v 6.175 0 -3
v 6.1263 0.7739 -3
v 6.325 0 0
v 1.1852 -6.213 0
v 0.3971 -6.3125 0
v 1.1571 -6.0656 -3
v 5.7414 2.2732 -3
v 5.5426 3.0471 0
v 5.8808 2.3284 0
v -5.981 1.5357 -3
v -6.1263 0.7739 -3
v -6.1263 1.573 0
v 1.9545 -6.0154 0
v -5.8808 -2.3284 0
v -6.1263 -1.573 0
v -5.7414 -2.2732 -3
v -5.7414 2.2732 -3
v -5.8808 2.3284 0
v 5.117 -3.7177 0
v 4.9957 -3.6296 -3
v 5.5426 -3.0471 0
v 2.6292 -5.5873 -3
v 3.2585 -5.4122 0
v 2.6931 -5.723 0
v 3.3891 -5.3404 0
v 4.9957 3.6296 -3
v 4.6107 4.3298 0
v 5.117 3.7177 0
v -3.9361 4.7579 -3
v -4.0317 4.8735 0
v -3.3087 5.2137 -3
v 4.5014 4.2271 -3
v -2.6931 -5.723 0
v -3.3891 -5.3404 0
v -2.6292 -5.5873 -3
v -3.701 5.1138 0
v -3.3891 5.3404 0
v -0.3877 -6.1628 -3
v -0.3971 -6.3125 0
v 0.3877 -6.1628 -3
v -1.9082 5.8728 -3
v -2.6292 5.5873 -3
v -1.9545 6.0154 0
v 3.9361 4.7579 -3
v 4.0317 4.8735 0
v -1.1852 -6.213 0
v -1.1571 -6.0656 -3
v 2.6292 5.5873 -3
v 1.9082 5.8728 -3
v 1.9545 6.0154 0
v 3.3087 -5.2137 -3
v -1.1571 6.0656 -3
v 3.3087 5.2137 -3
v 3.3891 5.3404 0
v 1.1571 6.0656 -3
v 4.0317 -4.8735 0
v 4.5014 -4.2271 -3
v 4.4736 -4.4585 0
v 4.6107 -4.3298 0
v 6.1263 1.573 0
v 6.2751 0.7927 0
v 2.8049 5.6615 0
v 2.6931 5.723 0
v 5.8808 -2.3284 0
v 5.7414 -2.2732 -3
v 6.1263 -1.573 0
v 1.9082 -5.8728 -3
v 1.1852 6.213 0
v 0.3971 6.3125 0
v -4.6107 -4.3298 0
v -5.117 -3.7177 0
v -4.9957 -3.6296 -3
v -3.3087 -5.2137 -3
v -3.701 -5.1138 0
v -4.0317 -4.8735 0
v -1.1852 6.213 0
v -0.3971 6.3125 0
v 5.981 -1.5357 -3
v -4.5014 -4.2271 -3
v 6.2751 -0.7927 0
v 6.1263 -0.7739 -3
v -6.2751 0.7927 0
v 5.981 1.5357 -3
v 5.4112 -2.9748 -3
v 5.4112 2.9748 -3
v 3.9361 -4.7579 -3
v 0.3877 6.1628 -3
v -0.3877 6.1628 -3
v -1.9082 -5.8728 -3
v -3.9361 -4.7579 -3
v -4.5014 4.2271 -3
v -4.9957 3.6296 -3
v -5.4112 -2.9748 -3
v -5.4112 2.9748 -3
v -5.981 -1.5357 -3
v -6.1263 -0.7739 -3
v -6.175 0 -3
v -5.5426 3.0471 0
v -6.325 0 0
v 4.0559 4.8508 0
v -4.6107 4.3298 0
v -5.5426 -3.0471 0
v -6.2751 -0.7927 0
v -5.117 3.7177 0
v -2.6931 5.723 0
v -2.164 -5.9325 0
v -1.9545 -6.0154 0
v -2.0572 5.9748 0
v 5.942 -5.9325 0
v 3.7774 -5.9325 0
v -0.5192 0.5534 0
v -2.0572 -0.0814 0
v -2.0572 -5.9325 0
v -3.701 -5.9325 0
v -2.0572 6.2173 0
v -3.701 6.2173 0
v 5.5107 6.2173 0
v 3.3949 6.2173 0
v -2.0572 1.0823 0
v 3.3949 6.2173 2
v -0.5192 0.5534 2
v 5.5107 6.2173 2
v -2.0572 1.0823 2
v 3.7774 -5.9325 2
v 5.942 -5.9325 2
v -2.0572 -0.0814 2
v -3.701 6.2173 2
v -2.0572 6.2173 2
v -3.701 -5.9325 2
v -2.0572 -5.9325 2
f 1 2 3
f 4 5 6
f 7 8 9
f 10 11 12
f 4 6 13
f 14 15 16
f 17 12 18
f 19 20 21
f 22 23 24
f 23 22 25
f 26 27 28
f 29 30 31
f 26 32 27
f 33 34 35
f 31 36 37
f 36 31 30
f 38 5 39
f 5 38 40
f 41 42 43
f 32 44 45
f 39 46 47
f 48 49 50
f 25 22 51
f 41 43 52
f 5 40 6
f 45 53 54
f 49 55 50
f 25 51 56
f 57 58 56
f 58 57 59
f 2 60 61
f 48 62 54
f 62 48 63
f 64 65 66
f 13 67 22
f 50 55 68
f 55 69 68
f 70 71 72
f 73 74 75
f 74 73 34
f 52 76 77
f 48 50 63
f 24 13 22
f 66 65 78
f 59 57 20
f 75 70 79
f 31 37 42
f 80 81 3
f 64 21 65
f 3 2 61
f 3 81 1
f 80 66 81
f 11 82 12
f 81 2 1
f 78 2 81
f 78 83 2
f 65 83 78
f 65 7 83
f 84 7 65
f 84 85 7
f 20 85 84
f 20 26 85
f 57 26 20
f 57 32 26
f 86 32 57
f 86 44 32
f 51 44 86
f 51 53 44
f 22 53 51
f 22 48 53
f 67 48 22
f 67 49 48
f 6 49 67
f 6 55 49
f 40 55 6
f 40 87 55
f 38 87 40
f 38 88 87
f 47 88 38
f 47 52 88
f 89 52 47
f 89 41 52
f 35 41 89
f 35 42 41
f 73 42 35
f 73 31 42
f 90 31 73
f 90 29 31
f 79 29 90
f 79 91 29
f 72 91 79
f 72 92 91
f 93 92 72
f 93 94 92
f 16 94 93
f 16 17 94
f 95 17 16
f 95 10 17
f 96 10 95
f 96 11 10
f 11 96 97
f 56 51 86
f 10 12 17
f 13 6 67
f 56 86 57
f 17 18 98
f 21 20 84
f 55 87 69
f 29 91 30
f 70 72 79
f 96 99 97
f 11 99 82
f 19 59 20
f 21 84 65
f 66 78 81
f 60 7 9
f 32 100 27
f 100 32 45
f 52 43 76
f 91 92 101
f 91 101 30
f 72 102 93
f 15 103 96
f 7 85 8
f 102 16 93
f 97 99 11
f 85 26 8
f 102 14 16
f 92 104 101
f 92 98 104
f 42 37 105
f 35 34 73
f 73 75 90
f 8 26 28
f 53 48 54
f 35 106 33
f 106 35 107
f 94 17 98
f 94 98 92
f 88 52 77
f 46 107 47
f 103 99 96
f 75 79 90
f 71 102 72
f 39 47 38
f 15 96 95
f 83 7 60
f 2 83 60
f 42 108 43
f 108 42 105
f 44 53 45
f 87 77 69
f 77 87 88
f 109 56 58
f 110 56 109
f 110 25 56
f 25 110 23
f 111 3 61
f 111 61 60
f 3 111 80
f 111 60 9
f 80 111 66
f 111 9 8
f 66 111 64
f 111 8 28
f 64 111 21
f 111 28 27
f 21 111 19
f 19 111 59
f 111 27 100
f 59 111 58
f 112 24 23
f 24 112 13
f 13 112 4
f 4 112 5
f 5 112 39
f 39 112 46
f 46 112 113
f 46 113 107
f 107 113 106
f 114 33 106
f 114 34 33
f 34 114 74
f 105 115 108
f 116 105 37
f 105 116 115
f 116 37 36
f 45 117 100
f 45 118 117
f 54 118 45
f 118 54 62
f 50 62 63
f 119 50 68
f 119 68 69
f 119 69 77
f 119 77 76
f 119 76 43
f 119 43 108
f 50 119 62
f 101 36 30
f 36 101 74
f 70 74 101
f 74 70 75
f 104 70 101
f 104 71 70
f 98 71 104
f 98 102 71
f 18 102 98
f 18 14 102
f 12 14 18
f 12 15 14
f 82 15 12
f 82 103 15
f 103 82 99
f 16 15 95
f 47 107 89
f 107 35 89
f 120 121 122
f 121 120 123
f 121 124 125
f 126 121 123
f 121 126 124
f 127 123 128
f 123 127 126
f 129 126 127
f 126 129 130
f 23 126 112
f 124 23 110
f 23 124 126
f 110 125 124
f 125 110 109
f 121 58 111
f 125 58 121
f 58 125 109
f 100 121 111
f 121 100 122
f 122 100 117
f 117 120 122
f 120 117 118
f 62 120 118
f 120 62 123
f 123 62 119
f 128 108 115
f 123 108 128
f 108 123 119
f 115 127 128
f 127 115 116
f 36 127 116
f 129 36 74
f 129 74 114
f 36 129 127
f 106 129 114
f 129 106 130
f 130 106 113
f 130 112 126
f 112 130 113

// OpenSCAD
$fn = 50;


difference() {
	union() {
		translate(v = [0, 0, -3.0000000000]) {
			cylinder(h = 3, r1 = 6.1750000000, r2 = 6.3250000000);
		}
		linear_extrude(height = 2) {
			text(font = "Impact", halign = "center", size = 12, text = "K", valign = "center");
		}
	}
	union();
}
